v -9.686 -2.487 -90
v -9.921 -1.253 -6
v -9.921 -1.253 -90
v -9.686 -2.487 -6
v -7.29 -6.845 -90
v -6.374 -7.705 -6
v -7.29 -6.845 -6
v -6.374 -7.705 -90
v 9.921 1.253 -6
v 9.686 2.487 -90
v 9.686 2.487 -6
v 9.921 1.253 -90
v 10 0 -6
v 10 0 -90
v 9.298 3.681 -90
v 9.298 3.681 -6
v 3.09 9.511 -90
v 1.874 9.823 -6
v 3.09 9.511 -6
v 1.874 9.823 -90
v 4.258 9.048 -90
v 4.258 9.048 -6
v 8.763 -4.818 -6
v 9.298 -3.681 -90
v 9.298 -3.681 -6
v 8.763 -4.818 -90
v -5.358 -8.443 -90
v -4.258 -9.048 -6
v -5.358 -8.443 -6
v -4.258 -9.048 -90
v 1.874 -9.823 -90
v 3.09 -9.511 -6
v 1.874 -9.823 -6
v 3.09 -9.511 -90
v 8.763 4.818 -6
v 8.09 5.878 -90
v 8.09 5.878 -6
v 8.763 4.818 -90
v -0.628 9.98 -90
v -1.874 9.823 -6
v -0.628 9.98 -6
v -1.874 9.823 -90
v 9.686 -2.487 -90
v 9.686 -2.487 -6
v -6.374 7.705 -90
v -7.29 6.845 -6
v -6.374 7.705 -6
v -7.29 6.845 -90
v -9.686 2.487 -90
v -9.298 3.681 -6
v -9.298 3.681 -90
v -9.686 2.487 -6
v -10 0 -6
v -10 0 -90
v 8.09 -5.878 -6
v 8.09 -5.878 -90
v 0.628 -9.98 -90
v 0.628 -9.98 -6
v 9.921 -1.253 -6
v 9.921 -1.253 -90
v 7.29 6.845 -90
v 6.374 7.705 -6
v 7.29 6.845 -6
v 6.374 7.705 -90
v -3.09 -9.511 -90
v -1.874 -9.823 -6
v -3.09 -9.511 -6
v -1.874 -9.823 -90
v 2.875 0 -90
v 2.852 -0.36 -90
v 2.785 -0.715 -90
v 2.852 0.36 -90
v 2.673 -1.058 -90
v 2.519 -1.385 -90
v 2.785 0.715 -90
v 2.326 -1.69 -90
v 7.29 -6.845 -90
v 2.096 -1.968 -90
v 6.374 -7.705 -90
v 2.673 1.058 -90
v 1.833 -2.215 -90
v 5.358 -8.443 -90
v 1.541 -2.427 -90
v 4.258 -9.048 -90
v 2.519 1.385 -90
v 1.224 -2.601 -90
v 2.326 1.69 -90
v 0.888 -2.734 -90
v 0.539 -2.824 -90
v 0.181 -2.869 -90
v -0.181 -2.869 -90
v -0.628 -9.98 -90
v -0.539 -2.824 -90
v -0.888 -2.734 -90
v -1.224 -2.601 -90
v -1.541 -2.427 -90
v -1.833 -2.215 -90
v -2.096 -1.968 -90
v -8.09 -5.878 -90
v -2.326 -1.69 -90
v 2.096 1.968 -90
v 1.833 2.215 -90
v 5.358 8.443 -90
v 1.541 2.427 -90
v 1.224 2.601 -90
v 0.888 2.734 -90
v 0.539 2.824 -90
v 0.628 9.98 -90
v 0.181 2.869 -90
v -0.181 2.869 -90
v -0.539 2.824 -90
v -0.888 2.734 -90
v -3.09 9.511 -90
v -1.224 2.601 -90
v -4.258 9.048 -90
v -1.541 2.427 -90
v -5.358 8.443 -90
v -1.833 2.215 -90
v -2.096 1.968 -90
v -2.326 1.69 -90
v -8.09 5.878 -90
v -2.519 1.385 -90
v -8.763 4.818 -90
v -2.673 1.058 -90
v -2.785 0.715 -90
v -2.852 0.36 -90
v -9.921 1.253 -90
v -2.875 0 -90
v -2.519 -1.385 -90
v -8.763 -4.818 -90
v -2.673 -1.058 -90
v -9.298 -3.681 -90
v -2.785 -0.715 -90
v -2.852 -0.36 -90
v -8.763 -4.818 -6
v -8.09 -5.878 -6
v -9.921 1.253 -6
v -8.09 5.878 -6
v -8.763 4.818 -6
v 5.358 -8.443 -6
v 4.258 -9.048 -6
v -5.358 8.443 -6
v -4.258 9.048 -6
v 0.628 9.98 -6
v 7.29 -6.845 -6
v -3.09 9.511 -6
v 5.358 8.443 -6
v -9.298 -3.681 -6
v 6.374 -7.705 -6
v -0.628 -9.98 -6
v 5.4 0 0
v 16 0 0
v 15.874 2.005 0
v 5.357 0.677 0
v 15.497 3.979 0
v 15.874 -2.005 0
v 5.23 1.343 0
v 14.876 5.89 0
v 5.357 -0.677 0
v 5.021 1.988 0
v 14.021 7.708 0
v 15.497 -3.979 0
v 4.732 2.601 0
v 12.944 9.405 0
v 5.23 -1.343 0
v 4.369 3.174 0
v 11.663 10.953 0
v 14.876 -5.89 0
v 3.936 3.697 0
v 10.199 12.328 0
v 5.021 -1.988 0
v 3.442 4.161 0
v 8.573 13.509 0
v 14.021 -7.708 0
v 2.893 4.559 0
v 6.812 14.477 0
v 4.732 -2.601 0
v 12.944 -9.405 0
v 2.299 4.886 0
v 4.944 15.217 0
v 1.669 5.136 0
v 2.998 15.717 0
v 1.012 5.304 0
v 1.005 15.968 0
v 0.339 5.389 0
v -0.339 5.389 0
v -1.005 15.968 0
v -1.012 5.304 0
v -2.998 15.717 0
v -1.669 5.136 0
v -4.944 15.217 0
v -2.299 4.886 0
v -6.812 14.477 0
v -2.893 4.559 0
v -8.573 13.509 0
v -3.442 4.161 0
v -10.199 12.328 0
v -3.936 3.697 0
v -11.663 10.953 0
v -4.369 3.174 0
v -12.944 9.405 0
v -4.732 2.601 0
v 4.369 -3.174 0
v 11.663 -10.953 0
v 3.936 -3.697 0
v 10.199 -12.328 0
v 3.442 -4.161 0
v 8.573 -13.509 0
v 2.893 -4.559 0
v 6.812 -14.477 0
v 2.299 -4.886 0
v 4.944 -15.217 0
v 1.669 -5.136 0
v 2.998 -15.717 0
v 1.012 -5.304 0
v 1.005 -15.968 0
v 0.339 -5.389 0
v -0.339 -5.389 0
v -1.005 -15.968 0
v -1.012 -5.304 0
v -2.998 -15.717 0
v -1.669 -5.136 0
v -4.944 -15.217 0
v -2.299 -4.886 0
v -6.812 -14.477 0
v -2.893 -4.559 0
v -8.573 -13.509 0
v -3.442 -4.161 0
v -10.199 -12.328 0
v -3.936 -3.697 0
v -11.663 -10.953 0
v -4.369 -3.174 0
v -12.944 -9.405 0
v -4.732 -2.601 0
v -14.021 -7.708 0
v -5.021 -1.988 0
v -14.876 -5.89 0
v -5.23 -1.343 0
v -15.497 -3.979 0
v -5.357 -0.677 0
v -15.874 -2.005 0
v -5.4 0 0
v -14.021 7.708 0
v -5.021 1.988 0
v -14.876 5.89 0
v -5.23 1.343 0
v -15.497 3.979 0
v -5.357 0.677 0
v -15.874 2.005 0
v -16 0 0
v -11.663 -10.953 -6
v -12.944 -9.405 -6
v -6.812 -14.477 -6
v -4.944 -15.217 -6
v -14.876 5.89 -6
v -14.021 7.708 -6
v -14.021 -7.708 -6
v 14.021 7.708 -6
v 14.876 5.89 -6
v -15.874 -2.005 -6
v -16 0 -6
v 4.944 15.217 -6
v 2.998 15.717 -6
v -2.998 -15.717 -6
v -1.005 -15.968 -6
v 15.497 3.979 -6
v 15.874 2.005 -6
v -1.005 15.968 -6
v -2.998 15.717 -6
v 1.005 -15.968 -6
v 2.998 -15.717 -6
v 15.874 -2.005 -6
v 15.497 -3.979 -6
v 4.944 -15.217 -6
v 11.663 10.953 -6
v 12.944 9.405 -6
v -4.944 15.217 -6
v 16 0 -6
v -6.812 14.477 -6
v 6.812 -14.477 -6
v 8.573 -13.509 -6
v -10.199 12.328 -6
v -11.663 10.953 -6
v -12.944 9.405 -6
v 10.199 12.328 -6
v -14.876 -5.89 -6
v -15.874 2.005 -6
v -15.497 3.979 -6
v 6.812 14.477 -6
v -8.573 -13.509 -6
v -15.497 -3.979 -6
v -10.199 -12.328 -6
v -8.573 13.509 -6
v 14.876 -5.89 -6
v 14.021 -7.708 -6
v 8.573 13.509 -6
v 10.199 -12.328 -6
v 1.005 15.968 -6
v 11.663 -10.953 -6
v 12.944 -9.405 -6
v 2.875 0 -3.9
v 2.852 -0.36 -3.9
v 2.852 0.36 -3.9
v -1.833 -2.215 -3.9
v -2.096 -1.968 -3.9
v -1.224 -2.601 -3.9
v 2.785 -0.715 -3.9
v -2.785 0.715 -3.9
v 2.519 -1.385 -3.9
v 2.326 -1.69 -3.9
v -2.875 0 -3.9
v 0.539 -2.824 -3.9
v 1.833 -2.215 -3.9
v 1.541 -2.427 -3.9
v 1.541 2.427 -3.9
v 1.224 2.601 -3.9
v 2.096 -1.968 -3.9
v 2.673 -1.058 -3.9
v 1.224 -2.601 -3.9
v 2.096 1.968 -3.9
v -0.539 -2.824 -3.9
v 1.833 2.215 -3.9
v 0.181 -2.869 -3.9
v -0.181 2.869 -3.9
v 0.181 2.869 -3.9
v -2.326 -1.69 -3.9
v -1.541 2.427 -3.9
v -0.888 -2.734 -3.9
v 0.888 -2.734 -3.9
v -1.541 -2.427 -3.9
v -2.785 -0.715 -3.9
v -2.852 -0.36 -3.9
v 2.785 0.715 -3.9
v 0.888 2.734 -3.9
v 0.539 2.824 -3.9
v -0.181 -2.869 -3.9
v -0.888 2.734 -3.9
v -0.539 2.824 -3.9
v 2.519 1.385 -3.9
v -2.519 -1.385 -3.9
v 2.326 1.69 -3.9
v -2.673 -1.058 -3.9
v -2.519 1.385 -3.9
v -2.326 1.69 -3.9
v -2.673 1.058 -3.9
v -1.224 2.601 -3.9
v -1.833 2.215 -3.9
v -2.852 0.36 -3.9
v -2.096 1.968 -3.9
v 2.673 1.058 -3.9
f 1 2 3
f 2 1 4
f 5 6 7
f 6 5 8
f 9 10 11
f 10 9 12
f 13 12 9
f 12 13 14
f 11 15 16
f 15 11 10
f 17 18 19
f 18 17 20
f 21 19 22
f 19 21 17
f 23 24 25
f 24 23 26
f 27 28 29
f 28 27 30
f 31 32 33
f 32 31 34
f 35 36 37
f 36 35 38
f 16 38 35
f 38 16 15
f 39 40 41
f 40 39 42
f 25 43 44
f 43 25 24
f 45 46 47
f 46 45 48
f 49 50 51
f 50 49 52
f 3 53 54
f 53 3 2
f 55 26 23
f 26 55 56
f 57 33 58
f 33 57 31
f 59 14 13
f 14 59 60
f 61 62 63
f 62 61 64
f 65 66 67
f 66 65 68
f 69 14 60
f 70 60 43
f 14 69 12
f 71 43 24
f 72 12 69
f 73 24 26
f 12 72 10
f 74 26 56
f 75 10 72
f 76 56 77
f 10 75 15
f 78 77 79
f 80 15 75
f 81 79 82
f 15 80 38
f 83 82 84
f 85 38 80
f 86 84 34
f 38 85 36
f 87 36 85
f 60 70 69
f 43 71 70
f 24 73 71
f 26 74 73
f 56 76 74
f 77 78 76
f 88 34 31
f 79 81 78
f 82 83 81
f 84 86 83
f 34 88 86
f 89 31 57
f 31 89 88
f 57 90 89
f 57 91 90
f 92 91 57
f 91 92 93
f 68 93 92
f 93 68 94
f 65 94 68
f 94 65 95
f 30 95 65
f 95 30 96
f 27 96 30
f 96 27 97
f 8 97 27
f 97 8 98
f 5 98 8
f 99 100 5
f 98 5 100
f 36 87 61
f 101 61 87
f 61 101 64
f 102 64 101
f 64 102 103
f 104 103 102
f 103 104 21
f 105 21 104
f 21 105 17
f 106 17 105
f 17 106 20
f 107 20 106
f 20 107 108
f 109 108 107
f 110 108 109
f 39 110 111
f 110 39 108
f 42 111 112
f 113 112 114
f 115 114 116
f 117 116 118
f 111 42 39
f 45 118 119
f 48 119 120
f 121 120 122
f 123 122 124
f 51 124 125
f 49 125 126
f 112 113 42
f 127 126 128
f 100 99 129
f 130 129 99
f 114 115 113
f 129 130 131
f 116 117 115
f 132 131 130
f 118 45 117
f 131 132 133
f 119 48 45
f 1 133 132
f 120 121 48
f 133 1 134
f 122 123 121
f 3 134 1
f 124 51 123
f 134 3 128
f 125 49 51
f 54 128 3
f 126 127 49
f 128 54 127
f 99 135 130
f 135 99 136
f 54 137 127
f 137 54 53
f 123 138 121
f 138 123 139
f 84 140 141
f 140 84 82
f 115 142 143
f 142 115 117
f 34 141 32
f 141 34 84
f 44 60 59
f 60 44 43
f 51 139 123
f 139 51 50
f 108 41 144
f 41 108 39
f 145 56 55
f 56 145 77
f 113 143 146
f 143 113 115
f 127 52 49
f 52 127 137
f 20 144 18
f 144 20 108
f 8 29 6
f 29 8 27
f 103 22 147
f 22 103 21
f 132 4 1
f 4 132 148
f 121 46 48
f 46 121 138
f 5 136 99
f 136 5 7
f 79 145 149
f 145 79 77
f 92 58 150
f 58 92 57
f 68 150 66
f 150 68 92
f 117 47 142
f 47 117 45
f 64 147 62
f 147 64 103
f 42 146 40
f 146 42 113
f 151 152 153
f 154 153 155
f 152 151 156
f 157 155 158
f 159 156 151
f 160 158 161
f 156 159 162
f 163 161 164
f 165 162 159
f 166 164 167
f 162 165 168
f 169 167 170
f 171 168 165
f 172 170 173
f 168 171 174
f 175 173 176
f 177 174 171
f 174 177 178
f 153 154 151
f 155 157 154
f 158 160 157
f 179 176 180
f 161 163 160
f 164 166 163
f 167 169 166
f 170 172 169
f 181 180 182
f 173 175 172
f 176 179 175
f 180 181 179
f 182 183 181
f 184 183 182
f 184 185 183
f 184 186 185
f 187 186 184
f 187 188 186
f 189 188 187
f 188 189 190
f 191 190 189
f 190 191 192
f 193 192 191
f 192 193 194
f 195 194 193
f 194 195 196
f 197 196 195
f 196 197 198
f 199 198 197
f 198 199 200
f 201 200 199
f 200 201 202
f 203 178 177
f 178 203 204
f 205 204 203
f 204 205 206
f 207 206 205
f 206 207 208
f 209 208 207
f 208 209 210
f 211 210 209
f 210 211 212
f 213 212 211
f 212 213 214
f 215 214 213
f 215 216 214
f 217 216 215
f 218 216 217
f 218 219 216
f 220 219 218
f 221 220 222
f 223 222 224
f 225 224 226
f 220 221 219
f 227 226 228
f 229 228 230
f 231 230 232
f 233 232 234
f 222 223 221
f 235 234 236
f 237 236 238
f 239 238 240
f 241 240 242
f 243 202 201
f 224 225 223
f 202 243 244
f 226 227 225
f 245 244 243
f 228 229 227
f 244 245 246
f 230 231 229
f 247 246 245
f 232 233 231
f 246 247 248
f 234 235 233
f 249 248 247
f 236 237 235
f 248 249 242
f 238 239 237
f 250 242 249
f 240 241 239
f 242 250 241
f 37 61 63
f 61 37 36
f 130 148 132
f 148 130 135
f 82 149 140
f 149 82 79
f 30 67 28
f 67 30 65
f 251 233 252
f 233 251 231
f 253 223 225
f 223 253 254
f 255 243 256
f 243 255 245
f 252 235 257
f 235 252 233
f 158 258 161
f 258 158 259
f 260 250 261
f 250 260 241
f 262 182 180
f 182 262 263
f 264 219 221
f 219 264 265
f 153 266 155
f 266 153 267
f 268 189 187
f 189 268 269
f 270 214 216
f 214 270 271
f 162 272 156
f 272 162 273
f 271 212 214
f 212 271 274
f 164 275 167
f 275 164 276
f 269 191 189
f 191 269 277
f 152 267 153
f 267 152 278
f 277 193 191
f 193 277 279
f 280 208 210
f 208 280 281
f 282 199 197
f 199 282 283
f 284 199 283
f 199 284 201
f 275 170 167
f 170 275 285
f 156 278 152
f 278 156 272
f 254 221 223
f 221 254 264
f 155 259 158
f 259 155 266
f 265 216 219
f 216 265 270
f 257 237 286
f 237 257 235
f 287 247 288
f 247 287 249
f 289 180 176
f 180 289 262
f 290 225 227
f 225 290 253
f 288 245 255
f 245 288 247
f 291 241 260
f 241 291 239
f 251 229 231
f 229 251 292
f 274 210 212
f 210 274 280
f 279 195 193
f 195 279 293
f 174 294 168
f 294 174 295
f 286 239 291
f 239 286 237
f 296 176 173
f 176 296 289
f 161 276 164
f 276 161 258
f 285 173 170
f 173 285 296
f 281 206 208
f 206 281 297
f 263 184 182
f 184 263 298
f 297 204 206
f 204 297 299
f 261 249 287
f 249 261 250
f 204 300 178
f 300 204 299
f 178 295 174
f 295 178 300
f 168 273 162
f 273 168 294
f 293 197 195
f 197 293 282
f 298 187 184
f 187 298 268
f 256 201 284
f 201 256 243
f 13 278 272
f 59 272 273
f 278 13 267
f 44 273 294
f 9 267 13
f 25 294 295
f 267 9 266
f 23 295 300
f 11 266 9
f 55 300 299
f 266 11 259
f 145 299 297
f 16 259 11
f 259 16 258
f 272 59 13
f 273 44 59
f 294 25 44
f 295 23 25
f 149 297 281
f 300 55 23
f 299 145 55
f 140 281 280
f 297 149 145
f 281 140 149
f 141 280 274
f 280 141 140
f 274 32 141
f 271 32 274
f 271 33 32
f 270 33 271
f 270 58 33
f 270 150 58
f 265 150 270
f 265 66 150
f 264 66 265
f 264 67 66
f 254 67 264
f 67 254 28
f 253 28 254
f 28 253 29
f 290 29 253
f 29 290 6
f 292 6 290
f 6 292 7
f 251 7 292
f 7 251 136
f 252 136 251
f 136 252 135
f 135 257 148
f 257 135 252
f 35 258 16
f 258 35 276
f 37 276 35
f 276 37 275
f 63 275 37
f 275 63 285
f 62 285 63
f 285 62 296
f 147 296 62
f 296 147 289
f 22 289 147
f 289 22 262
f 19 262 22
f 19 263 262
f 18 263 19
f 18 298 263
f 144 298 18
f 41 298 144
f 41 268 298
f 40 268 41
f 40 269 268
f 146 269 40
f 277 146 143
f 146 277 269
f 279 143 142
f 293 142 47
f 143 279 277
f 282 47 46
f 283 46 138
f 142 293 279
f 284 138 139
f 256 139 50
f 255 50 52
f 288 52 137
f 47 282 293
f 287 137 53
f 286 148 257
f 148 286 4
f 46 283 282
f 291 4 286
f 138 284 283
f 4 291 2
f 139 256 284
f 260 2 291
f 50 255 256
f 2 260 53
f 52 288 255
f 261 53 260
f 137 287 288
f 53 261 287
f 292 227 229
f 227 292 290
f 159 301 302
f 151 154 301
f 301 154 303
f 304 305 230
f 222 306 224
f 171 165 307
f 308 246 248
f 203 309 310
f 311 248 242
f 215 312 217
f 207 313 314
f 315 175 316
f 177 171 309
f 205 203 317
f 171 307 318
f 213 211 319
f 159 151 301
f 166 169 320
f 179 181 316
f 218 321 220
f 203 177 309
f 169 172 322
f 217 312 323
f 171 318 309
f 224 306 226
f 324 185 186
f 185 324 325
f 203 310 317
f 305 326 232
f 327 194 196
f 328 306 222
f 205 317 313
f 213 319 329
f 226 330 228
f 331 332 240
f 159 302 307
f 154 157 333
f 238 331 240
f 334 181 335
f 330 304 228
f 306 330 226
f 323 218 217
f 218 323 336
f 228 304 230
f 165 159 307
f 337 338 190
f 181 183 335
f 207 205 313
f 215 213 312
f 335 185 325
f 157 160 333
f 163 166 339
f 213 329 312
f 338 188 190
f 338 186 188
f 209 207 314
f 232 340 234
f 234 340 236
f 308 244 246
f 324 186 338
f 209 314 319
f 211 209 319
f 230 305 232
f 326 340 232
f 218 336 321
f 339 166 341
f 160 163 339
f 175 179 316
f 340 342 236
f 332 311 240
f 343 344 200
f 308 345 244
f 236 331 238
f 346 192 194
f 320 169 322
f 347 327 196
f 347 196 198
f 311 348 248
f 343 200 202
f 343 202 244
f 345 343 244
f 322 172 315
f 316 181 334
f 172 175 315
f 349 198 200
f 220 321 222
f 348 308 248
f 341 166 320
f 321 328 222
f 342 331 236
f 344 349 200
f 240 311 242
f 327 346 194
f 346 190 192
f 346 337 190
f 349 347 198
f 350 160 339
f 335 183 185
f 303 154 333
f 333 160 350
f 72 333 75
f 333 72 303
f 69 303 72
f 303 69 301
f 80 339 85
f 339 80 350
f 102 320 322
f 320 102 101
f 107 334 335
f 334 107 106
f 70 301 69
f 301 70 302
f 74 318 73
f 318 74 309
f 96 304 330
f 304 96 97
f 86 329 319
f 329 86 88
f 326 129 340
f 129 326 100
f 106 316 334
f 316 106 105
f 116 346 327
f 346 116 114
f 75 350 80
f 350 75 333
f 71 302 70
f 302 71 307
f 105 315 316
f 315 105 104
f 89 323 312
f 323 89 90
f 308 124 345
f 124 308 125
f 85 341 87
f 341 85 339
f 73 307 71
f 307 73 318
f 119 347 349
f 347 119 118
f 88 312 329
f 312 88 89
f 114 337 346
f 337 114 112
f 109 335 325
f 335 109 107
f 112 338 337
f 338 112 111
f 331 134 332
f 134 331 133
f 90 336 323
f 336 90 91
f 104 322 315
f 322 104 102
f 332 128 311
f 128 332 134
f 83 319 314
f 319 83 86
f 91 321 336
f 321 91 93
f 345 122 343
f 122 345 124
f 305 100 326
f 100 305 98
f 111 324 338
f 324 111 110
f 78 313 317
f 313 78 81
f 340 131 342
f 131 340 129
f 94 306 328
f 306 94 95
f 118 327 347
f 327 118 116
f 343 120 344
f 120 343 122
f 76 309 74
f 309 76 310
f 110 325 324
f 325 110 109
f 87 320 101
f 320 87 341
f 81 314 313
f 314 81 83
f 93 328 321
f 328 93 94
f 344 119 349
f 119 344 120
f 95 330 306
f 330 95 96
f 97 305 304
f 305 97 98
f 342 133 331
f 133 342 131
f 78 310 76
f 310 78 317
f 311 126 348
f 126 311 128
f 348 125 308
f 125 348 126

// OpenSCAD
$fn = 50;


difference() {
	union() {
		translate(v = [0, 0, -90.0000000000]) {
			cylinder(h = 90, r = 10.0000000000);
		}
		translate(v = [0, 0, -6.0000000000]) {
			cylinder(h = 6, r = 16.0000000000);
		}
	}
	union() {
		translate(v = [0, 0, 0]) {
			rotate(a = [0, 0, 0]) {
				difference() {
					union() {
						#translate(v = [0, 0, -90.0000000000]) {
							cylinder(h = 90, r = 2.6000000000);
						}
						#translate(v = [0, 0, -3.9000000000]) {
							cylinder(h = 3.9000000000, r1 = 2.8750000000, r2 = 5.4000000000);
						}
						#translate(v = [0, 0, -90.0000000000]) {
							cylinder(h = 90, r = 2.8750000000);
						}
						#translate(v = [0, 0, -90.0000000000]) {
							cylinder(h = 90, r = 2.6000000000);
						}
					}
					union();
				}
			}
		}
	}
}
